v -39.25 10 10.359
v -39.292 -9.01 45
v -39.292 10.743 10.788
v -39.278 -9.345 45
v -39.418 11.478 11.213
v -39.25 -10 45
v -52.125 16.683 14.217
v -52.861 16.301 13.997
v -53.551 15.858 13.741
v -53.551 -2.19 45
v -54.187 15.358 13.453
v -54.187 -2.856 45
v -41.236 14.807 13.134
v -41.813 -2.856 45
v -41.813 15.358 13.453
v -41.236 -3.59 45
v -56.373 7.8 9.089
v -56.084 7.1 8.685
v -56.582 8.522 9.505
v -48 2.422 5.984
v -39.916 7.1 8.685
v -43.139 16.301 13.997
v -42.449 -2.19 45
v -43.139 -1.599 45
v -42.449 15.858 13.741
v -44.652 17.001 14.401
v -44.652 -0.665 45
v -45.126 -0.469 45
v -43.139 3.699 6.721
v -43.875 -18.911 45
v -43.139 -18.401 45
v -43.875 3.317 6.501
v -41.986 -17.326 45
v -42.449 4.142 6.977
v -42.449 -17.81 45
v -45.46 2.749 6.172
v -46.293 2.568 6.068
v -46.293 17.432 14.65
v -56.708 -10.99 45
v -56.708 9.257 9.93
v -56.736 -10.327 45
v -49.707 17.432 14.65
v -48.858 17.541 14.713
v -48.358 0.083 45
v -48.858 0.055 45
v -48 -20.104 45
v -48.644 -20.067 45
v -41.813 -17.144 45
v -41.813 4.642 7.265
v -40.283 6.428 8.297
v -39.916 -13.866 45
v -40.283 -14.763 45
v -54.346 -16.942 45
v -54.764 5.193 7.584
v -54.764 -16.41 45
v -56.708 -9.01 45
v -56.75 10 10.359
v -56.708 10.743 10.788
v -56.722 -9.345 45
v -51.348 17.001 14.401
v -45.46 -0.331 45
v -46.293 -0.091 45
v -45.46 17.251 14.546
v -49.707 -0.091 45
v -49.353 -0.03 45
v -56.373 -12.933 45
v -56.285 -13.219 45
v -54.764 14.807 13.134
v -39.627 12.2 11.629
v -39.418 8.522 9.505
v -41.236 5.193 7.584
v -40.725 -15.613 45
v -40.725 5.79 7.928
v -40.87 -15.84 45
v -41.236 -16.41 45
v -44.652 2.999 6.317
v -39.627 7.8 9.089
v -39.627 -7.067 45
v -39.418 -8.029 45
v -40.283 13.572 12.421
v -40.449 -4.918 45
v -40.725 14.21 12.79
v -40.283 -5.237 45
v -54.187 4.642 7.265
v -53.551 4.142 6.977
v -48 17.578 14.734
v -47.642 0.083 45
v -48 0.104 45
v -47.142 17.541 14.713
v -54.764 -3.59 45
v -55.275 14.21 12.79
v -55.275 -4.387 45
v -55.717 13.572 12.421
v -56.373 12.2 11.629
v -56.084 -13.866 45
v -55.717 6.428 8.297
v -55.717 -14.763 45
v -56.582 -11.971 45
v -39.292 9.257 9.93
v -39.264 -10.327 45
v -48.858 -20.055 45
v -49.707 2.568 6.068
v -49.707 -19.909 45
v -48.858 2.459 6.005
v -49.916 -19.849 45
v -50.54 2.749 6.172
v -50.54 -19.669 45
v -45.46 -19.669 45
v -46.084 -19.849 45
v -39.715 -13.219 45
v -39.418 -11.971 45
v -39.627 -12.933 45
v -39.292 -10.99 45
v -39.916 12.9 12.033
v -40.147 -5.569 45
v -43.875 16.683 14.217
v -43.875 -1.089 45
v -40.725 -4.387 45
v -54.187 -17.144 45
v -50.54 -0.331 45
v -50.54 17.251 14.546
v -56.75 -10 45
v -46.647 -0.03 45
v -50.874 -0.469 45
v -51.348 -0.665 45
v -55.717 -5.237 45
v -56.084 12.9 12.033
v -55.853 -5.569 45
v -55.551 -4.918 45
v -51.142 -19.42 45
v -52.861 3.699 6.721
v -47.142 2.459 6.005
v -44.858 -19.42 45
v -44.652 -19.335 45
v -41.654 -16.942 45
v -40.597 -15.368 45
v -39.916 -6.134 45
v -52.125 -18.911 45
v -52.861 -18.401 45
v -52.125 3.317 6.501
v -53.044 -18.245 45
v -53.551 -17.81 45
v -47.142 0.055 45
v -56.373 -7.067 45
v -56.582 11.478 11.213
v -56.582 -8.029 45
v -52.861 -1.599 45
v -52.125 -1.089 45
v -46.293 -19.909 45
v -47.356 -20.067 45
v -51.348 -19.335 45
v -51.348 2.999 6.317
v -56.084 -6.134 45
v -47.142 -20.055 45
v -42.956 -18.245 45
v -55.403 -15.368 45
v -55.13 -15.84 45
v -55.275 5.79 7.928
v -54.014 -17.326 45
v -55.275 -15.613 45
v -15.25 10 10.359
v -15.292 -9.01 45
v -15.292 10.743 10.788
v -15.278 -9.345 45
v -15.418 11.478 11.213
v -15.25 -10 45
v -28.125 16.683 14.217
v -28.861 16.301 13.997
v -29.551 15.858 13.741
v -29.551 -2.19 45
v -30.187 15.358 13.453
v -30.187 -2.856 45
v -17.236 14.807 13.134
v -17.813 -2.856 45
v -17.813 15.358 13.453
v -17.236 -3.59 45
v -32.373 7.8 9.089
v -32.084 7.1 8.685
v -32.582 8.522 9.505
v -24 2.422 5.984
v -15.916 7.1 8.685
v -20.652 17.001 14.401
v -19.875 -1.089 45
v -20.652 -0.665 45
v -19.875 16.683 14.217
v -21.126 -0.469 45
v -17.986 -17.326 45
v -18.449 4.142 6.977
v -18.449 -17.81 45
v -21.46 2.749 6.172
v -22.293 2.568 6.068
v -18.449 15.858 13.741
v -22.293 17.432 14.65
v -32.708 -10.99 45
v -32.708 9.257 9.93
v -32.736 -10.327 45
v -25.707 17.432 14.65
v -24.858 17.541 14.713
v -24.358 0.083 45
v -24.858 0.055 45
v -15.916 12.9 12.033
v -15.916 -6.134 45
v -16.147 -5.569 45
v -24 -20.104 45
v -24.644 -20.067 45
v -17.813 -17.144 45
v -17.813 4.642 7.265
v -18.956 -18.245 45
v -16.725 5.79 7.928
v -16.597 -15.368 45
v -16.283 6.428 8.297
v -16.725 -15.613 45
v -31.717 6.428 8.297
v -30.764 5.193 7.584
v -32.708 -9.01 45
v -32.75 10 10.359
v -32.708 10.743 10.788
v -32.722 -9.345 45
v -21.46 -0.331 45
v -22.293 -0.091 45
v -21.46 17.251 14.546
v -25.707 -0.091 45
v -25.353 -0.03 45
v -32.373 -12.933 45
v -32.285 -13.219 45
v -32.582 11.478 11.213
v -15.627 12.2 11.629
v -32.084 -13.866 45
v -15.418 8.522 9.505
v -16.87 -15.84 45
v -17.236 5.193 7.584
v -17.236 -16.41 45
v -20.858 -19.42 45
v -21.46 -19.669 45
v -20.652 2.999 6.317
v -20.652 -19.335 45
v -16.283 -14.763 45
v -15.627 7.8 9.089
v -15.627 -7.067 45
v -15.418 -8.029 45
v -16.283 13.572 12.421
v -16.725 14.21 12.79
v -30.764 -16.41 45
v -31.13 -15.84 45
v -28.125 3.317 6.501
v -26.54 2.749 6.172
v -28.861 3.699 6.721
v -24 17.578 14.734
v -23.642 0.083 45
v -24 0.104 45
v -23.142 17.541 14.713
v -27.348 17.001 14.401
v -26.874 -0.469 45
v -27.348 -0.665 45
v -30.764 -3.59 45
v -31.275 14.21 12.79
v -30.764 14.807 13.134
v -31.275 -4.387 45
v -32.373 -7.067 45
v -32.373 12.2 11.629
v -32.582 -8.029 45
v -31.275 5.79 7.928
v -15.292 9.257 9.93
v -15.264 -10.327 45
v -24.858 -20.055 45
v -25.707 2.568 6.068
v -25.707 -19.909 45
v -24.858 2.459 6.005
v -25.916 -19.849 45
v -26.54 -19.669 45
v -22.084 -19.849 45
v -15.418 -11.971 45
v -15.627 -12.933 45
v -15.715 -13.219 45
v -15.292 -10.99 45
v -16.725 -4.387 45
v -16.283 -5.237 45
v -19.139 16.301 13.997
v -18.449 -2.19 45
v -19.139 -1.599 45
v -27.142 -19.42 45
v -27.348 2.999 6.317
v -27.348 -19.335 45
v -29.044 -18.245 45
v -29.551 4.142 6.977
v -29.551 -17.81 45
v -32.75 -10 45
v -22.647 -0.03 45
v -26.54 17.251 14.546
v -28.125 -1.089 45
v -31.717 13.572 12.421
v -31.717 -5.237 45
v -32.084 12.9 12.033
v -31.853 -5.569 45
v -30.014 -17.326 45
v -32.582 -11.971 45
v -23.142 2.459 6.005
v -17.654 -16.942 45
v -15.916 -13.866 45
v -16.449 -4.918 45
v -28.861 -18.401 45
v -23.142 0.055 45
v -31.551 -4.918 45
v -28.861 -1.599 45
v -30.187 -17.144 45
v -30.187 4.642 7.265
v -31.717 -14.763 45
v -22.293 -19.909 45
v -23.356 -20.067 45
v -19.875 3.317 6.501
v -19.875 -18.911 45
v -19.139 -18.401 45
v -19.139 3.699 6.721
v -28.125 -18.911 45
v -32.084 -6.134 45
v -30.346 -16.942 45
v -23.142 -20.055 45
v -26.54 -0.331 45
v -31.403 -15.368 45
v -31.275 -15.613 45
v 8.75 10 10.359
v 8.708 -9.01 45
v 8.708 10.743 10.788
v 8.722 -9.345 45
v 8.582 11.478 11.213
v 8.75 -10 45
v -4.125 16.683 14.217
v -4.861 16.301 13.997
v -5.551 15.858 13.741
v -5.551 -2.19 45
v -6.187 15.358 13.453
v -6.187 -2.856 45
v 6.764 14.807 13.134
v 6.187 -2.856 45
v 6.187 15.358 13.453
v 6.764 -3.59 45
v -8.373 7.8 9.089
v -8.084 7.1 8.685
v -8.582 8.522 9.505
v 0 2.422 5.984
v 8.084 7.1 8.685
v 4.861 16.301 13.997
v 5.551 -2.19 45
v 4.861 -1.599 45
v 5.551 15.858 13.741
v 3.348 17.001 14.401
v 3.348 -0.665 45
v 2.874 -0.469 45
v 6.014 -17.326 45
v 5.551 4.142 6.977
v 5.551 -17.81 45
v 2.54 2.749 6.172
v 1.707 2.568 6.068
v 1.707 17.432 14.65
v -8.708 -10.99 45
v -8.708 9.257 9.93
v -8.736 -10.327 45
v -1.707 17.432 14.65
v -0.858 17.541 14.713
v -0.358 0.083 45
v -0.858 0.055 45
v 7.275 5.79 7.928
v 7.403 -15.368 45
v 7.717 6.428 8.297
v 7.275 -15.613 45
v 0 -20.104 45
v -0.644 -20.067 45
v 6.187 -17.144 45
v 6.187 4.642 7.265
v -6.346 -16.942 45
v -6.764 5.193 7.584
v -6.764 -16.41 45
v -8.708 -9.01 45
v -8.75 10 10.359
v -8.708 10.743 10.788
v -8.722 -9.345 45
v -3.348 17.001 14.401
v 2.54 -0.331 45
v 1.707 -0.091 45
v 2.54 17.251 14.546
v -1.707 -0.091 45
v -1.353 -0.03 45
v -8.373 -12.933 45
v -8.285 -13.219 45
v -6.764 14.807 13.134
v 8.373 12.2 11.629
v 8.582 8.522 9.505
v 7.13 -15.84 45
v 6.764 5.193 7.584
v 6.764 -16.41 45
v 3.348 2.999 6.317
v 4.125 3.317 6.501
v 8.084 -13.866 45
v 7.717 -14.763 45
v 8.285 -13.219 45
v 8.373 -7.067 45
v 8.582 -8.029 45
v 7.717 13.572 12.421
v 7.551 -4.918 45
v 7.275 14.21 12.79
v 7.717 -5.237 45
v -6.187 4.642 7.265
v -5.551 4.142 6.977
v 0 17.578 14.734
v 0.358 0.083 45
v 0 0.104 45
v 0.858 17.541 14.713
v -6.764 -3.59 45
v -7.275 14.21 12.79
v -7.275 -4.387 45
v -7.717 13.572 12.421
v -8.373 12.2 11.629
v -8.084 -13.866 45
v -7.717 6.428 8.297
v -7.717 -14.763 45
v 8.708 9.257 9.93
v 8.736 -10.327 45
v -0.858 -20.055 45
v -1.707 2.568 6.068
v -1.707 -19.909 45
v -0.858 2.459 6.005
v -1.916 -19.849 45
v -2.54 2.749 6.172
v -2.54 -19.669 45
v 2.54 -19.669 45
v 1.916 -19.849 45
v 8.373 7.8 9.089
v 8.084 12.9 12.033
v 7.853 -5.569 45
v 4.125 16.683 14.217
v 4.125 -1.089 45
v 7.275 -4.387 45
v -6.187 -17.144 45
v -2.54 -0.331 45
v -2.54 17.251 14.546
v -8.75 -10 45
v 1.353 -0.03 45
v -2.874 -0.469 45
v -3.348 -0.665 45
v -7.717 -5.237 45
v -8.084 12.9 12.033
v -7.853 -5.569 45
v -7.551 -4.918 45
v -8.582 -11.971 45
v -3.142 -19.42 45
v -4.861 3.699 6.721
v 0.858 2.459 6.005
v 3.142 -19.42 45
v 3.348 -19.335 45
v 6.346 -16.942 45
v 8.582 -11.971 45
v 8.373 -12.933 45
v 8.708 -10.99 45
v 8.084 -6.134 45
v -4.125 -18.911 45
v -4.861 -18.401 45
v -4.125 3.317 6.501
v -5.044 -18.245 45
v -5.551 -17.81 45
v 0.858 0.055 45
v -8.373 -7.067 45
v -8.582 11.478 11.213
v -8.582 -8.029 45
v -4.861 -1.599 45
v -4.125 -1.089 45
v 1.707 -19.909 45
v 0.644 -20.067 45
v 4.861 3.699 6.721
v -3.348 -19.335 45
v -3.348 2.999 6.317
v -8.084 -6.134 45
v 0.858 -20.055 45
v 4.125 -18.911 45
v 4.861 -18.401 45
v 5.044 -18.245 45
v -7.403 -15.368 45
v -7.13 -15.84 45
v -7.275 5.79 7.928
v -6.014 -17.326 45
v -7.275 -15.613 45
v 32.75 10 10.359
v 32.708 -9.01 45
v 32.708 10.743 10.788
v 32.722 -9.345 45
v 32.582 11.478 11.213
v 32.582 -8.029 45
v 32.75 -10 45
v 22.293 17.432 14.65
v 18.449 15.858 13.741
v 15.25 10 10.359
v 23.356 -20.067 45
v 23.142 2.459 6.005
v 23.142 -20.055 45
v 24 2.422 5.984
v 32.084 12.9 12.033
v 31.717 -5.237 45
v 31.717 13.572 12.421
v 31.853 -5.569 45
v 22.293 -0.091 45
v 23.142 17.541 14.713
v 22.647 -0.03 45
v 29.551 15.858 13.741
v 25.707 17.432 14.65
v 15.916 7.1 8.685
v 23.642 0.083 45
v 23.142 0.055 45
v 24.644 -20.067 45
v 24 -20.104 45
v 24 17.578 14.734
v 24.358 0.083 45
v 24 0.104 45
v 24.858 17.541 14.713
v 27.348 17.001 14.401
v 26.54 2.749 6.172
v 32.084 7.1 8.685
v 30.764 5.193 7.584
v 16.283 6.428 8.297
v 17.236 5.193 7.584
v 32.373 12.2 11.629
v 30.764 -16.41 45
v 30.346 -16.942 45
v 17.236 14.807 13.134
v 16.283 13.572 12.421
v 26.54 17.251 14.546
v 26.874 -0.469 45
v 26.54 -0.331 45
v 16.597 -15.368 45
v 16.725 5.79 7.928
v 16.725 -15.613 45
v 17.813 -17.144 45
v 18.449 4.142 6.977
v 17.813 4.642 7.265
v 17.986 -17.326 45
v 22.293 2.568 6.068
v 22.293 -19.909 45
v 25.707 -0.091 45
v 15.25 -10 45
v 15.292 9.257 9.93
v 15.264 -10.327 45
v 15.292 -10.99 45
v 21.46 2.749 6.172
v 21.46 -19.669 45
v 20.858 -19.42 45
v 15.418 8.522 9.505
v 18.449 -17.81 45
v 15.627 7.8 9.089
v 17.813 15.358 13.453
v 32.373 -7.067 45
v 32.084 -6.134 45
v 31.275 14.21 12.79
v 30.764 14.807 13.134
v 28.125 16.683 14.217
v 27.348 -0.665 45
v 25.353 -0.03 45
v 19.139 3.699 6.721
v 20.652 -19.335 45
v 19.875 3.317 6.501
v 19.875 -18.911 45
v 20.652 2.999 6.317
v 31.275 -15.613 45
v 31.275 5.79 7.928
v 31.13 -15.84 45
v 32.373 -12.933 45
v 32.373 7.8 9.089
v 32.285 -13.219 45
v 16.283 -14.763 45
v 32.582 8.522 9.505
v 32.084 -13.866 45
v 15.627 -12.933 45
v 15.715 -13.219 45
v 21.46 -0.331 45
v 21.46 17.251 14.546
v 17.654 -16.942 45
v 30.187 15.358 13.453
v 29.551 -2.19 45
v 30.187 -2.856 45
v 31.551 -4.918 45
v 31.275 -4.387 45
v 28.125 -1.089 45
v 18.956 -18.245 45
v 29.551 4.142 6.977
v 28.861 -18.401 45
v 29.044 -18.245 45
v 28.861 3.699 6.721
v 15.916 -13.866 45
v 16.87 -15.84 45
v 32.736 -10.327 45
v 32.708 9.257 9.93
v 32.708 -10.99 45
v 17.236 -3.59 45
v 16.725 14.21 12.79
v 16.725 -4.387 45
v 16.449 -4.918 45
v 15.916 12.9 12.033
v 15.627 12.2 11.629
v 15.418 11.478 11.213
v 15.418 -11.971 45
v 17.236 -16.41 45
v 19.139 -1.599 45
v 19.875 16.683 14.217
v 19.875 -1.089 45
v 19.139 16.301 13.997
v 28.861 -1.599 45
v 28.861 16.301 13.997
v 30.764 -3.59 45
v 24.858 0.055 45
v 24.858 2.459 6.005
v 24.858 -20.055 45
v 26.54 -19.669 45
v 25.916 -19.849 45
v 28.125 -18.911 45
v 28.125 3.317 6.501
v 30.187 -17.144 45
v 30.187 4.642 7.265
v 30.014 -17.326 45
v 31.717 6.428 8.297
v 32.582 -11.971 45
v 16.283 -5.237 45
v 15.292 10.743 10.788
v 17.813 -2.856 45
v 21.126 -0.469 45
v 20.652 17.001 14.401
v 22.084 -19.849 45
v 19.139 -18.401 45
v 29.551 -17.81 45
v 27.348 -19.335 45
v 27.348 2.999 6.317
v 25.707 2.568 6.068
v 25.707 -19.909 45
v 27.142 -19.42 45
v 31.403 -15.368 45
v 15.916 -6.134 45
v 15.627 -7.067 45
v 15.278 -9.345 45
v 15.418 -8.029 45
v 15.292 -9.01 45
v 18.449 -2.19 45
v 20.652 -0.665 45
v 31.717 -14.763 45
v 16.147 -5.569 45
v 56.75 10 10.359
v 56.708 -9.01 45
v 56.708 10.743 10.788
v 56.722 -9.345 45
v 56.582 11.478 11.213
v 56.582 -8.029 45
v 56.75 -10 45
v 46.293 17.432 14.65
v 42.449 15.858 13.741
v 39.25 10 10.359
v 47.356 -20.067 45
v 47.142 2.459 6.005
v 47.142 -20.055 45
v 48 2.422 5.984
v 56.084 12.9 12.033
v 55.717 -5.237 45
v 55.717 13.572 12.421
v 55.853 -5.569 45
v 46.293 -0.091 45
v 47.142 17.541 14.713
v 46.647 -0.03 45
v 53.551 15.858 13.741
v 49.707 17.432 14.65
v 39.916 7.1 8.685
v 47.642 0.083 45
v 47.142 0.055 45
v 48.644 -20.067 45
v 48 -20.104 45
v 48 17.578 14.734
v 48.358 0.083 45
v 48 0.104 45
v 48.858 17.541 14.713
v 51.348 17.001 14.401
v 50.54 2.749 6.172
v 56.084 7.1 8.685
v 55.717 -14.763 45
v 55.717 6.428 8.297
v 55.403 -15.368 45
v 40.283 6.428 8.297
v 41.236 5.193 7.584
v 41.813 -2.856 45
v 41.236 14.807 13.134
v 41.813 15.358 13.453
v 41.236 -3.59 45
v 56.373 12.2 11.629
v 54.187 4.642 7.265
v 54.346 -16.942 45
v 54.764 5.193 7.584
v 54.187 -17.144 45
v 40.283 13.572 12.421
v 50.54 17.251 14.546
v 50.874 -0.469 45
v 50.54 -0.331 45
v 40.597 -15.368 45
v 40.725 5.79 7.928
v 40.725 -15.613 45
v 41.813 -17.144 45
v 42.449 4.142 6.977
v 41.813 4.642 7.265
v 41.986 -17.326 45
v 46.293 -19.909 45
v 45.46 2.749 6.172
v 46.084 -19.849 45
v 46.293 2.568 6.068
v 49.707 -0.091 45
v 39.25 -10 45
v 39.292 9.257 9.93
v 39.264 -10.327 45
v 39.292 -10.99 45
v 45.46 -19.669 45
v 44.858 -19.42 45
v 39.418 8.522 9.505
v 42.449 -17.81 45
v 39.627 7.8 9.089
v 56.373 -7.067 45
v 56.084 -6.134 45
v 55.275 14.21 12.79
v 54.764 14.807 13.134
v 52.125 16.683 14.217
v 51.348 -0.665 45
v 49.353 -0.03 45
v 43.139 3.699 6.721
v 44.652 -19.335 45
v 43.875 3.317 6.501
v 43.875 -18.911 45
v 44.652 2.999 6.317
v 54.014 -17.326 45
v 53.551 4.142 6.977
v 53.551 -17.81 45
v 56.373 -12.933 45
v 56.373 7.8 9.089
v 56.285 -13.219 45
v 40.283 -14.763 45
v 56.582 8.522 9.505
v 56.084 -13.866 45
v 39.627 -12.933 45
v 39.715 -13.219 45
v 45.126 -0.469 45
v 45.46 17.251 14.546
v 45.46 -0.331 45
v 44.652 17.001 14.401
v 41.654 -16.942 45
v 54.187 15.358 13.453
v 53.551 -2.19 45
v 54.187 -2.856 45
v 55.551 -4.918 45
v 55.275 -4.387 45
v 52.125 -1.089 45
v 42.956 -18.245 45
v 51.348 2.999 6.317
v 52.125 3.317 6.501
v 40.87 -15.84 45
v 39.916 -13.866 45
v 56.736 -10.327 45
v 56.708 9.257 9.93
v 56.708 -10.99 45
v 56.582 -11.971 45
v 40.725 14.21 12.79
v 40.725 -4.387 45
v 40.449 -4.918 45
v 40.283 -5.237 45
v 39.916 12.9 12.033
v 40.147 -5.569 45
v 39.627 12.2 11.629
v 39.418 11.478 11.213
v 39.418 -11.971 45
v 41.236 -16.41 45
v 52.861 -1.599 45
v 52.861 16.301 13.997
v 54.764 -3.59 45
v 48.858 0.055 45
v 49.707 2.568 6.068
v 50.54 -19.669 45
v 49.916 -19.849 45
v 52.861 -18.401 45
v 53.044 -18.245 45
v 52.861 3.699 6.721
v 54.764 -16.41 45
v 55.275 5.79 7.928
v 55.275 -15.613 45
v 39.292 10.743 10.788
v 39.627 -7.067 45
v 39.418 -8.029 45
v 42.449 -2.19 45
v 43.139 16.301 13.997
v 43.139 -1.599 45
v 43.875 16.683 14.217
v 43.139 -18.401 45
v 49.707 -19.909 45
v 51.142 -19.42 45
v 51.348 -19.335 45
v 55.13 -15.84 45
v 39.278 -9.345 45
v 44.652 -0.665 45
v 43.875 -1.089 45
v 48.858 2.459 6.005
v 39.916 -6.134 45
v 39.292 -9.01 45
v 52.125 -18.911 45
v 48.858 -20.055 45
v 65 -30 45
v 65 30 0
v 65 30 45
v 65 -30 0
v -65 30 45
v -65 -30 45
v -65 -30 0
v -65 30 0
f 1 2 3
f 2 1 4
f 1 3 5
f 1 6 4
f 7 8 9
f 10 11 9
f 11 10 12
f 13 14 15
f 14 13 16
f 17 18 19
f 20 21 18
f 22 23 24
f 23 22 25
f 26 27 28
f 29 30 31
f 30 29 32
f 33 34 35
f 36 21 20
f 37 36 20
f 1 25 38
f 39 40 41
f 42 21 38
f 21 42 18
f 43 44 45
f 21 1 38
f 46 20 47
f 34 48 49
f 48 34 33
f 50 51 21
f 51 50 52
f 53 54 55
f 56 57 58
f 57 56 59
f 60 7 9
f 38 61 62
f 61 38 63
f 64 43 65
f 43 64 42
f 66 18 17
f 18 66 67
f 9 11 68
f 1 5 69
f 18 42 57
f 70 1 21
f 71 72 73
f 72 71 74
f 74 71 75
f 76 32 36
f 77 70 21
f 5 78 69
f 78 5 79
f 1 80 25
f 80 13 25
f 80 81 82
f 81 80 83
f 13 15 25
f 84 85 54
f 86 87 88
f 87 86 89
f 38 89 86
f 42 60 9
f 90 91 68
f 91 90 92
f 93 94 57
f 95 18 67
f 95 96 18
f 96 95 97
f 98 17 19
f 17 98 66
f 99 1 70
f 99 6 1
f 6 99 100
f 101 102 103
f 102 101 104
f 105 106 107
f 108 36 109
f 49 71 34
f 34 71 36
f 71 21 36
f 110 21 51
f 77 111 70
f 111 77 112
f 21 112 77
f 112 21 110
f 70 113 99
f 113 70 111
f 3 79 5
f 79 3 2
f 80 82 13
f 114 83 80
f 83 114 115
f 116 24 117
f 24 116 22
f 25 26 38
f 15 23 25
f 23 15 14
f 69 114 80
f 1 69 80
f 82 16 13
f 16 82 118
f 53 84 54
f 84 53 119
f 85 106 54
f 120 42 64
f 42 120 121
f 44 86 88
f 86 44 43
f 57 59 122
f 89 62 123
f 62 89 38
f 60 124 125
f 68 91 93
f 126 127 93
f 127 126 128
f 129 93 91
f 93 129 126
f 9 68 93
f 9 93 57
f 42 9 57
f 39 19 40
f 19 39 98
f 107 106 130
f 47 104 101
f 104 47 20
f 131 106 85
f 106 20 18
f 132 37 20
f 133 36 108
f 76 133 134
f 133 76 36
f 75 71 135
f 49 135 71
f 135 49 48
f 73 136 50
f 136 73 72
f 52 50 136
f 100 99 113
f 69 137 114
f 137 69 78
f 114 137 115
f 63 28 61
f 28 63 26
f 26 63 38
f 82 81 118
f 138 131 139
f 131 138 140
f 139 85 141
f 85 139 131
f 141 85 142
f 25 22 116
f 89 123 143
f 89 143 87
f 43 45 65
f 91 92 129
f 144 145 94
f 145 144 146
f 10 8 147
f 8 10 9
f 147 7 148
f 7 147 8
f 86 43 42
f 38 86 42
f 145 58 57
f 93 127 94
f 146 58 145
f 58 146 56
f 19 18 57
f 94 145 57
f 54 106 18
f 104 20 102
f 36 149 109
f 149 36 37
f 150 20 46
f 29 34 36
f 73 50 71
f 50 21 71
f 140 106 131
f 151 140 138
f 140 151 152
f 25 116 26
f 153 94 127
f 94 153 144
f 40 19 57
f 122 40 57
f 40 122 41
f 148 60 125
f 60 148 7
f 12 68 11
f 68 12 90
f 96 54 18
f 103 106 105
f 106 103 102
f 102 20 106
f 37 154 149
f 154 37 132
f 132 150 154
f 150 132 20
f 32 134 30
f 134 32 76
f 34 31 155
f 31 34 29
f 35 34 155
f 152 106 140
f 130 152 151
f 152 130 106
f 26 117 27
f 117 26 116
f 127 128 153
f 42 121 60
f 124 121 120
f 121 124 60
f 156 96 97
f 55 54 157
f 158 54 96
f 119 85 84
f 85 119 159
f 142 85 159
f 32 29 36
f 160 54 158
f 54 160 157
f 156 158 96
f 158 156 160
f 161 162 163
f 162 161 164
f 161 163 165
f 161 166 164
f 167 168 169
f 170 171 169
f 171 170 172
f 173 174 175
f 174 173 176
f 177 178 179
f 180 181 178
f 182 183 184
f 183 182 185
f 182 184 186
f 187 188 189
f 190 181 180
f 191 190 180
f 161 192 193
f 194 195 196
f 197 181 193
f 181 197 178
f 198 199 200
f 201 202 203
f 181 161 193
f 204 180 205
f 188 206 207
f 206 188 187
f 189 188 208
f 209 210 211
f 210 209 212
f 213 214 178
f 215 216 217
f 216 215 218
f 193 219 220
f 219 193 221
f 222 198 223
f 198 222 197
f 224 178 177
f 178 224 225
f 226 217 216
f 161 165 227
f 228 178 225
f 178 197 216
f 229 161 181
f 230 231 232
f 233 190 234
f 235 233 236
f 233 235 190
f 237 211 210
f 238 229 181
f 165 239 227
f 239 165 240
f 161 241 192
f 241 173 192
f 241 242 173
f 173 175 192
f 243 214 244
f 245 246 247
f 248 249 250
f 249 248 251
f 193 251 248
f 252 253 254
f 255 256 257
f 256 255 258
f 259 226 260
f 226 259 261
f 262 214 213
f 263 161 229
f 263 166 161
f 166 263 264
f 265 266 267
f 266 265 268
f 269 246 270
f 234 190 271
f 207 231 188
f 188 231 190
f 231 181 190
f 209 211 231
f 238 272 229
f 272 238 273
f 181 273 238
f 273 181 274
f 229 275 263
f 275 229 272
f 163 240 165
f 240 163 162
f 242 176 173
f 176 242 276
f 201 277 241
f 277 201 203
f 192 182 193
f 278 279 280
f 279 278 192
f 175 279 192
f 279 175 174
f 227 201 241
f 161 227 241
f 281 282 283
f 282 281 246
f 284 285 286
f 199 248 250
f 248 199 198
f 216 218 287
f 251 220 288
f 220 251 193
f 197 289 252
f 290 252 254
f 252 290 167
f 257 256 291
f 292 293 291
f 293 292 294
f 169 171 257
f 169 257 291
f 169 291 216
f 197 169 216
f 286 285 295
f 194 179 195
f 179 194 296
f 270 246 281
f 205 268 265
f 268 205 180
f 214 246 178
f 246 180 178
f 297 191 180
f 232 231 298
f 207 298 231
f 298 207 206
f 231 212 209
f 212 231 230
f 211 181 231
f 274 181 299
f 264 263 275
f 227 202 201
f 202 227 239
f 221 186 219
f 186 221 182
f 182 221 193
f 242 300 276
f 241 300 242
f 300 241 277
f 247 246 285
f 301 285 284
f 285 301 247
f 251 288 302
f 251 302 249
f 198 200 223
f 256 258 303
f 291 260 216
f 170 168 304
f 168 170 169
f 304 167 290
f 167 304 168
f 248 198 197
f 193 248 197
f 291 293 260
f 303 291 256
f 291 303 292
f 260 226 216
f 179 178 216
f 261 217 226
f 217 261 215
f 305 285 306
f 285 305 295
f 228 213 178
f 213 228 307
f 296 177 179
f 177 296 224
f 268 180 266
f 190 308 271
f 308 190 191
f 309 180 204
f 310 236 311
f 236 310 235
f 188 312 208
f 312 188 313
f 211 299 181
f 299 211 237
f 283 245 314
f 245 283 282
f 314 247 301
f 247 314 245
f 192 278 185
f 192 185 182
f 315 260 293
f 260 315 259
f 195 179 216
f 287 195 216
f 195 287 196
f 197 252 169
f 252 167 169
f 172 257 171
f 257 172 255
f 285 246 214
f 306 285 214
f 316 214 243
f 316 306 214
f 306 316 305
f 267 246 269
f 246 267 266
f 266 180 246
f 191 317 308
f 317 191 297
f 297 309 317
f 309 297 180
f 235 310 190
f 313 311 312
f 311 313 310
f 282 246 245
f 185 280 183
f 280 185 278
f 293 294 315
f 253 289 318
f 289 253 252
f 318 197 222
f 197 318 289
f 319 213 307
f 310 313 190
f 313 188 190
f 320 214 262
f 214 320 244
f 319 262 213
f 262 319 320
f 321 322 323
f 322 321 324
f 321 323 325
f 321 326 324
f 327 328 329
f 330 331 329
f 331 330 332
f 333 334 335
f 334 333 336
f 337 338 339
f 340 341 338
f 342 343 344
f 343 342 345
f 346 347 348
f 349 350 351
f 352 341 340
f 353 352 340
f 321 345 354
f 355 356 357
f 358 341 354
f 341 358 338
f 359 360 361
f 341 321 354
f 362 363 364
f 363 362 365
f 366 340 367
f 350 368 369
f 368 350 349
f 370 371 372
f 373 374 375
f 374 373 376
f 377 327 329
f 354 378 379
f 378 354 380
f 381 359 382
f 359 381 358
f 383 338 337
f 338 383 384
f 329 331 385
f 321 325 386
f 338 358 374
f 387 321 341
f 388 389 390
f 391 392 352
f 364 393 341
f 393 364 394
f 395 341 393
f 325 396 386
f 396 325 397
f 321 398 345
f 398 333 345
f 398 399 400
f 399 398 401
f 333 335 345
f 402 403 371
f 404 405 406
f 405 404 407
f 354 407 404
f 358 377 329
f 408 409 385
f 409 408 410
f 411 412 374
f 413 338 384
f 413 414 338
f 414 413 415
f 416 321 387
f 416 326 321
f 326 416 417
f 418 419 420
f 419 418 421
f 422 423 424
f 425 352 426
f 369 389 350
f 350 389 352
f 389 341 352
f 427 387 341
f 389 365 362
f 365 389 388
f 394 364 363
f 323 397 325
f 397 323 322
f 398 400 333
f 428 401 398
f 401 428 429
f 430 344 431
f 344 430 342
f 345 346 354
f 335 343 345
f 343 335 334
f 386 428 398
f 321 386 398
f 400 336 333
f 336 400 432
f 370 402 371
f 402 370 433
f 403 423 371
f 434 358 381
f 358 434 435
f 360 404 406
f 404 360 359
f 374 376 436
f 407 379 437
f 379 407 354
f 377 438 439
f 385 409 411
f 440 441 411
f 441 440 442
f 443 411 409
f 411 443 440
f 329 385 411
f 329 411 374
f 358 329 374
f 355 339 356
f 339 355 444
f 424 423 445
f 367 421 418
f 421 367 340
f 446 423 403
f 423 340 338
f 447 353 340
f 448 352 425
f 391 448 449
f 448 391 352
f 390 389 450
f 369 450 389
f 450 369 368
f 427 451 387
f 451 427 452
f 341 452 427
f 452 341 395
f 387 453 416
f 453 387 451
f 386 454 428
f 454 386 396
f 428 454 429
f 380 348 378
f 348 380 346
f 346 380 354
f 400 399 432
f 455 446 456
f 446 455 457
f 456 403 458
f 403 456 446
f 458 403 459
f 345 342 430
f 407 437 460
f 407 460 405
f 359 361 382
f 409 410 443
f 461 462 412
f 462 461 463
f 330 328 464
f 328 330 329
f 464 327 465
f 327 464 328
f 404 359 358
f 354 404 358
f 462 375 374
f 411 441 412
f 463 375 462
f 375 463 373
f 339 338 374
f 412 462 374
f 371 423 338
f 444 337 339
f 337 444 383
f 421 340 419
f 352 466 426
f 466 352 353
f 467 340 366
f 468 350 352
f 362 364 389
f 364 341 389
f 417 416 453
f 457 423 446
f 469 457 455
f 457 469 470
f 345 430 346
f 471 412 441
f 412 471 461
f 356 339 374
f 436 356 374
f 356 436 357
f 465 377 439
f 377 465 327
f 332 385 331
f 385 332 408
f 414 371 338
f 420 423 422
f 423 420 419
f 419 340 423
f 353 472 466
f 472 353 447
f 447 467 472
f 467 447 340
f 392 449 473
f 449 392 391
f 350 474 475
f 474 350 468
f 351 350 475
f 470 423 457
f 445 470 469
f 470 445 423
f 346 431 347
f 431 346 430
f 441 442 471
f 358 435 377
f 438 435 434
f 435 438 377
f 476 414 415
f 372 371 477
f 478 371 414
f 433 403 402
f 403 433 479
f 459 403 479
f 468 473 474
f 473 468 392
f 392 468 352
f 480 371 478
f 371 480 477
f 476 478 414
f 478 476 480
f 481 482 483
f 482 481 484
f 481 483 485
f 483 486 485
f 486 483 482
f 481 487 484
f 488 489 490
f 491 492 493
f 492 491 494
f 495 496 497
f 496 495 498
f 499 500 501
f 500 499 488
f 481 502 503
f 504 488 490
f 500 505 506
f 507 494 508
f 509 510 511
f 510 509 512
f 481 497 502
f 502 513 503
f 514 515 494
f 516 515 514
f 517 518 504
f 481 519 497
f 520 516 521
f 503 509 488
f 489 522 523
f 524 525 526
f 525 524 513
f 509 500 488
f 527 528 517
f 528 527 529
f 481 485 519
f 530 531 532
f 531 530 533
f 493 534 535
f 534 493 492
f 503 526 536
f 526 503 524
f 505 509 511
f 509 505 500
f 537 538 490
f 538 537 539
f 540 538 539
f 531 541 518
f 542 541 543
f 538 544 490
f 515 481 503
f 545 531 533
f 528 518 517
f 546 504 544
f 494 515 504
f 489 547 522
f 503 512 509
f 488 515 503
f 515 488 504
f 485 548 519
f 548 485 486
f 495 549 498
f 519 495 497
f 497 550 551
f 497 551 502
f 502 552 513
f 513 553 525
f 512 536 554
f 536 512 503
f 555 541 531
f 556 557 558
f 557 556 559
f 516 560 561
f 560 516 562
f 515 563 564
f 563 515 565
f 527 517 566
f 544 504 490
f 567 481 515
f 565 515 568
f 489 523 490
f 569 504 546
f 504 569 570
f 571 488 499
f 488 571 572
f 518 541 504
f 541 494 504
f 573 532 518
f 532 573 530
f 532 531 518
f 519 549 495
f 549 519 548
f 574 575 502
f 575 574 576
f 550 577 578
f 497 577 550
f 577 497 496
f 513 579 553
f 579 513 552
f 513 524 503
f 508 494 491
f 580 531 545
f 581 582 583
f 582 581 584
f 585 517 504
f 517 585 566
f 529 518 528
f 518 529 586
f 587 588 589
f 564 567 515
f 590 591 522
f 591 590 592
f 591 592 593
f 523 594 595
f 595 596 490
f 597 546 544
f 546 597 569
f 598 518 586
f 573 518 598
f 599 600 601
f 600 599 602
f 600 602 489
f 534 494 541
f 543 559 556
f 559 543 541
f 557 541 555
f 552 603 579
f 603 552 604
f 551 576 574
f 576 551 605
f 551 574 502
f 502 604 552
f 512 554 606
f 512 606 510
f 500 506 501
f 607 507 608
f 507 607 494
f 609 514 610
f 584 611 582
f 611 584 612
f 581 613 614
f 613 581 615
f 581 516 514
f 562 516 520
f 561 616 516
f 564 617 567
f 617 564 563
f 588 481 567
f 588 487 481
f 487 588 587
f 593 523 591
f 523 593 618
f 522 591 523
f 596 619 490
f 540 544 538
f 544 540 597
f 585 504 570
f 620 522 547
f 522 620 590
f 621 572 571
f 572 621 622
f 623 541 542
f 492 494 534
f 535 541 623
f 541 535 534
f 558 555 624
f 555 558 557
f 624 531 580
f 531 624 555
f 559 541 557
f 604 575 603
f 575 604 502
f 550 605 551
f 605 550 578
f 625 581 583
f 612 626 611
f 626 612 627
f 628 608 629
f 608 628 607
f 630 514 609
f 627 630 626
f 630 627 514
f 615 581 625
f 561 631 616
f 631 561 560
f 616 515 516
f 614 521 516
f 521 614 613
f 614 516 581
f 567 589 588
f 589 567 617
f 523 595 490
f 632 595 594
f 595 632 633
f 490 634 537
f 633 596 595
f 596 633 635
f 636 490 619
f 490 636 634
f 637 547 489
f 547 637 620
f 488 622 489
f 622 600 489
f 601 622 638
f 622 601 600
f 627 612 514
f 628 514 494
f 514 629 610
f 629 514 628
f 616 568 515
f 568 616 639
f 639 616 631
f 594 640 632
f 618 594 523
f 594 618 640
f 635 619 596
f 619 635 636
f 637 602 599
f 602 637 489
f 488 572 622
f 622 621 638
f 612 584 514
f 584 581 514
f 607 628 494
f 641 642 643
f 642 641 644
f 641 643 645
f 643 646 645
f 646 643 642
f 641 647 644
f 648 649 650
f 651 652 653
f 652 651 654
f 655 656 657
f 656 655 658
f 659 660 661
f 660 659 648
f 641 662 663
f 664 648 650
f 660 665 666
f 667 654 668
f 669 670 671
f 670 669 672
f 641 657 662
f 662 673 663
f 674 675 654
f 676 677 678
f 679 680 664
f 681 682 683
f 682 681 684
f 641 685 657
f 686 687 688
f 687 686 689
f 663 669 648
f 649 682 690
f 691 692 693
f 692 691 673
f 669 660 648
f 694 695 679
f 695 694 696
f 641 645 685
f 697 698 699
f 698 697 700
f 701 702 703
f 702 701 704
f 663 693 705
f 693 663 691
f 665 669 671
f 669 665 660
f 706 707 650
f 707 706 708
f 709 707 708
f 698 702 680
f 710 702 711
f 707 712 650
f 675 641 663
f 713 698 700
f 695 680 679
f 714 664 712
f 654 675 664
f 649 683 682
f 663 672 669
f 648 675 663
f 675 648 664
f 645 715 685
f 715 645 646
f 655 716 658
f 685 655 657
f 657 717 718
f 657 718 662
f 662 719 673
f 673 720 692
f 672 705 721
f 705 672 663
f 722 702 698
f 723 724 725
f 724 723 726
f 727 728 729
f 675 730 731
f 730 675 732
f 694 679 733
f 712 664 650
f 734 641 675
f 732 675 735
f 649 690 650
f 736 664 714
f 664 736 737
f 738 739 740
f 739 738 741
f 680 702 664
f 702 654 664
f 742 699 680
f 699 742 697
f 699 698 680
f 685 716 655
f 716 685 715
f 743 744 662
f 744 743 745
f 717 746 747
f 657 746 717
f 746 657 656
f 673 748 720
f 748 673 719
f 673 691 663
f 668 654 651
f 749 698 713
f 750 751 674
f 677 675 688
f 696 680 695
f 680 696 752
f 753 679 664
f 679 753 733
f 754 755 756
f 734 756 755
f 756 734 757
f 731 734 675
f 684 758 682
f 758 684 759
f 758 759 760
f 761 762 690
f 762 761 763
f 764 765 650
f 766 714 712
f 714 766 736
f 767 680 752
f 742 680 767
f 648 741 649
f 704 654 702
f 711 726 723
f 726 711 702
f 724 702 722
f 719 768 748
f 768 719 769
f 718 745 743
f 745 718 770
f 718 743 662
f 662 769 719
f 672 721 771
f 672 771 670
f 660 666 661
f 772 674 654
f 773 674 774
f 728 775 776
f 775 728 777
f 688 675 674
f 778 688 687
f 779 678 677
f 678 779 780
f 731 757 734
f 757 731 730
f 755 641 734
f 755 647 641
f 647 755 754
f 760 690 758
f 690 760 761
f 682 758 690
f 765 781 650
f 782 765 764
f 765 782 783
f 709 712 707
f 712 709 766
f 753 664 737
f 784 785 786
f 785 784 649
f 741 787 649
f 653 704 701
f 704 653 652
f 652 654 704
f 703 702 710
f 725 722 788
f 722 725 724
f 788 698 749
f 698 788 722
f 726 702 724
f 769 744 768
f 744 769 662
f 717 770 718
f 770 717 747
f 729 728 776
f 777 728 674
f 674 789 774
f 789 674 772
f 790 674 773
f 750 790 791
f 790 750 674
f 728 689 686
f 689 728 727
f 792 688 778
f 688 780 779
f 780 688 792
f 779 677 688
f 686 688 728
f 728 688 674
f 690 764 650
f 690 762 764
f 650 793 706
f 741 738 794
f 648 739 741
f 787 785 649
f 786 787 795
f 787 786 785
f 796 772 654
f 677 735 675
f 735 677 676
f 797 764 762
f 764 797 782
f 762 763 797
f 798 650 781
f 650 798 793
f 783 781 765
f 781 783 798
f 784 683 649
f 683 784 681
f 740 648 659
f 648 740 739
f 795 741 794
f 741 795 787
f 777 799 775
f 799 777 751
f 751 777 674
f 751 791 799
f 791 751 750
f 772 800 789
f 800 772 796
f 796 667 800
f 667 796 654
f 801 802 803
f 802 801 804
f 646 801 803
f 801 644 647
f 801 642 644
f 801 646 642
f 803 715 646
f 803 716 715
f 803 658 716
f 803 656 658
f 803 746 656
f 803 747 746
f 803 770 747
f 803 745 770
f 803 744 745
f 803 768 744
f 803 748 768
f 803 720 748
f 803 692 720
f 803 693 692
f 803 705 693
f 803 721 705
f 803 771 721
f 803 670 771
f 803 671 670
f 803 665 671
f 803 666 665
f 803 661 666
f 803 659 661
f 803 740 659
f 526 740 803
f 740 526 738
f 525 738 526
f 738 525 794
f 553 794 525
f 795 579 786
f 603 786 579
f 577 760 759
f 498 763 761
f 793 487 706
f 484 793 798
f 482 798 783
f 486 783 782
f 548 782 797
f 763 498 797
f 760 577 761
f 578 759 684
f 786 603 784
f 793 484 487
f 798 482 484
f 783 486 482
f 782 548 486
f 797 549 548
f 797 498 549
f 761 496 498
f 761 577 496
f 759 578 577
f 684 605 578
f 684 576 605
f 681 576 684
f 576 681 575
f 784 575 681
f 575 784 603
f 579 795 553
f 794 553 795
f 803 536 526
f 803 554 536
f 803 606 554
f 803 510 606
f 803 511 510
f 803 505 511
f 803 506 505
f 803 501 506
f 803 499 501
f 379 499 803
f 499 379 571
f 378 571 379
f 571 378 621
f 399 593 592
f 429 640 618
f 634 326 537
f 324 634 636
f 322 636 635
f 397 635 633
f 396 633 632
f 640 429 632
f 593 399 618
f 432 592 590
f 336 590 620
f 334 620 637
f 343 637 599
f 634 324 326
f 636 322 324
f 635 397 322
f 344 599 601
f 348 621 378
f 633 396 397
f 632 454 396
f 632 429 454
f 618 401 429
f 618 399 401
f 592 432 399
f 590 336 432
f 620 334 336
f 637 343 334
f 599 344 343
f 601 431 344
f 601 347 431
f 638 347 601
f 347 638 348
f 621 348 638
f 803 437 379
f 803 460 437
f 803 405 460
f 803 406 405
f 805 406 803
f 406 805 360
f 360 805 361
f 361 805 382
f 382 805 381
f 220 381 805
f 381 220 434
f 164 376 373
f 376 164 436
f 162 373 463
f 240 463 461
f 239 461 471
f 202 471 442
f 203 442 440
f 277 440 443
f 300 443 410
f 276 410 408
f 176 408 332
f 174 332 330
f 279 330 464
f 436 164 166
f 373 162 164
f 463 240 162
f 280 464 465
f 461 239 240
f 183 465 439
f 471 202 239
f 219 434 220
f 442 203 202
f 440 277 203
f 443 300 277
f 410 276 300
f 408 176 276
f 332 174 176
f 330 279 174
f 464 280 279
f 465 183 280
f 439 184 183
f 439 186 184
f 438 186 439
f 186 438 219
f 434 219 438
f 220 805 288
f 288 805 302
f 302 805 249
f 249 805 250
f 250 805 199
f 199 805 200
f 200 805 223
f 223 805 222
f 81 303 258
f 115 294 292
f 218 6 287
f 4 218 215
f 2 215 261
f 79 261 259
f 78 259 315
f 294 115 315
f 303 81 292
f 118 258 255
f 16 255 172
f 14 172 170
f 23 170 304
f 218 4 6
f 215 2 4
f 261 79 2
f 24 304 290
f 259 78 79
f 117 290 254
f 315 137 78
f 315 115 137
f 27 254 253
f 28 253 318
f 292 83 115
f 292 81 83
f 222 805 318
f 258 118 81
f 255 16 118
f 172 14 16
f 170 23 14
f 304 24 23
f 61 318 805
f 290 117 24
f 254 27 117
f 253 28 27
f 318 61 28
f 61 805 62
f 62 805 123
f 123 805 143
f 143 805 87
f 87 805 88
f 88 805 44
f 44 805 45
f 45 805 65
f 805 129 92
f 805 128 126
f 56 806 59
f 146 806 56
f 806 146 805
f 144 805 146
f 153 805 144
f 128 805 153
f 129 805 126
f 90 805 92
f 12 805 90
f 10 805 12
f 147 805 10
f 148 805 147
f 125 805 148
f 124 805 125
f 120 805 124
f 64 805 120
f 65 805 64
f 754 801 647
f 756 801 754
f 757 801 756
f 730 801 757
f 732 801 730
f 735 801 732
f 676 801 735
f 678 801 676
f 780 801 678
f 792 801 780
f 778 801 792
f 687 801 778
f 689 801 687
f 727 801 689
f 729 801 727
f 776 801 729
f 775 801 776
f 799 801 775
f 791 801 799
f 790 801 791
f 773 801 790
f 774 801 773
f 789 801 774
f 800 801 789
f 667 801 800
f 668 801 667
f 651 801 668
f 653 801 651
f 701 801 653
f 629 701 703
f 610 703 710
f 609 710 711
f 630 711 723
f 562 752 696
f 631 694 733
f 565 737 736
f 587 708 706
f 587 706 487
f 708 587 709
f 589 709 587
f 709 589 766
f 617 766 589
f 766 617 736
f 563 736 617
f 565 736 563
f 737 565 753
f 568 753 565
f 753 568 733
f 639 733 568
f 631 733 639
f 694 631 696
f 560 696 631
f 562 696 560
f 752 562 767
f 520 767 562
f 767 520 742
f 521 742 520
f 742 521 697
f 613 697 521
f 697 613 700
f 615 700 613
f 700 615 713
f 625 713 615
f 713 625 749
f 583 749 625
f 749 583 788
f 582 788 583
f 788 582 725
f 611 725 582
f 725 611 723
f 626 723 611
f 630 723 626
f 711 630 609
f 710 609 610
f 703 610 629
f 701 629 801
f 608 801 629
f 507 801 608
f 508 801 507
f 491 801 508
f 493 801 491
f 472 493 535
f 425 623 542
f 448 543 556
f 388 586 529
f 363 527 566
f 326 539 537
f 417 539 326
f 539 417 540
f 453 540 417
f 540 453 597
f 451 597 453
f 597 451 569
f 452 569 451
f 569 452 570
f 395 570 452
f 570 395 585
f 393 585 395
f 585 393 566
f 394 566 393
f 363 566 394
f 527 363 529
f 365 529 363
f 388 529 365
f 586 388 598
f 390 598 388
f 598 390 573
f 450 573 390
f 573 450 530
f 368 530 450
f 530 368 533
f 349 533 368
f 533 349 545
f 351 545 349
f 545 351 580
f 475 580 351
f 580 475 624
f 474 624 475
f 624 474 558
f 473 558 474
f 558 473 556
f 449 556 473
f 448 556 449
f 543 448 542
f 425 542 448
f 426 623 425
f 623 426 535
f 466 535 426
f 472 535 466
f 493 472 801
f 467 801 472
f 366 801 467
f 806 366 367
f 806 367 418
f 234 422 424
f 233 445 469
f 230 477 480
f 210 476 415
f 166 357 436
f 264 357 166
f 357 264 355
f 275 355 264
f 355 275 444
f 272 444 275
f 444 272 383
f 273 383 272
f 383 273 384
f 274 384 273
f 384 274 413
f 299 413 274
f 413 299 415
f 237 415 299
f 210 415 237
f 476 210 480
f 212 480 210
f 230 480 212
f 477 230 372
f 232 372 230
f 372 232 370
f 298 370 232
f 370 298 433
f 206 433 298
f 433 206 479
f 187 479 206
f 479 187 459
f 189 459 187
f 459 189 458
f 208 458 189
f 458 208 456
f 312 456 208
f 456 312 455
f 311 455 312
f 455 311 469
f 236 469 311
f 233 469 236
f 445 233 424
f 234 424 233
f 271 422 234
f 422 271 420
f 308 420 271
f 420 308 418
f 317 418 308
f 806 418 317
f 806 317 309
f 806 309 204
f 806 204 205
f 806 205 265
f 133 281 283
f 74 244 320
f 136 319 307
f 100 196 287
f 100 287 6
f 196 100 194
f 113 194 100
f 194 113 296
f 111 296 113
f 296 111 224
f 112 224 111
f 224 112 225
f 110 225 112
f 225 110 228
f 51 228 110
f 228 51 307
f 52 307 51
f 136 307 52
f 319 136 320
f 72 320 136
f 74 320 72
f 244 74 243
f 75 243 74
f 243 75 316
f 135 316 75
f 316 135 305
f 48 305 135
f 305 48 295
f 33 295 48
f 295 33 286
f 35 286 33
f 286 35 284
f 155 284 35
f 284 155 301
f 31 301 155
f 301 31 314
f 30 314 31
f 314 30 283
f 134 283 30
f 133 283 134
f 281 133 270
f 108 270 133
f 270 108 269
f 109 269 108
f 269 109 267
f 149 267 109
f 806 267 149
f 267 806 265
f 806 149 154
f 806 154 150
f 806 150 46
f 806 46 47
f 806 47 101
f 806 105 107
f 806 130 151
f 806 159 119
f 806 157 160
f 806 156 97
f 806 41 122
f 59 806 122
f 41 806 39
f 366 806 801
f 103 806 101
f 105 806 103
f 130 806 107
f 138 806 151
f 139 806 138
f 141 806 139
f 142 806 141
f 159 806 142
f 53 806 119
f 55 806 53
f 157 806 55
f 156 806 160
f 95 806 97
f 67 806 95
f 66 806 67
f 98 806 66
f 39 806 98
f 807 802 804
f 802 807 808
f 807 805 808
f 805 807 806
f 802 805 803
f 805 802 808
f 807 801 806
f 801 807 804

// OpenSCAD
// KNOWN-RIGHT ALTERNATIVE (must pass): a correct part coded independently, each hole placed by its bottom centre
// holes as rotated cylinders placed by their bottom centre
difference(){ translate([-65,-30,0]) cube([130,60,45]);
 for(i=[-2:2]) translate([i*24, -10 + 40*sin(30), 45 - 40*cos(30)]) rotate([30,0,0]) cylinder(d=17.5,h=60,$fn=64); }
